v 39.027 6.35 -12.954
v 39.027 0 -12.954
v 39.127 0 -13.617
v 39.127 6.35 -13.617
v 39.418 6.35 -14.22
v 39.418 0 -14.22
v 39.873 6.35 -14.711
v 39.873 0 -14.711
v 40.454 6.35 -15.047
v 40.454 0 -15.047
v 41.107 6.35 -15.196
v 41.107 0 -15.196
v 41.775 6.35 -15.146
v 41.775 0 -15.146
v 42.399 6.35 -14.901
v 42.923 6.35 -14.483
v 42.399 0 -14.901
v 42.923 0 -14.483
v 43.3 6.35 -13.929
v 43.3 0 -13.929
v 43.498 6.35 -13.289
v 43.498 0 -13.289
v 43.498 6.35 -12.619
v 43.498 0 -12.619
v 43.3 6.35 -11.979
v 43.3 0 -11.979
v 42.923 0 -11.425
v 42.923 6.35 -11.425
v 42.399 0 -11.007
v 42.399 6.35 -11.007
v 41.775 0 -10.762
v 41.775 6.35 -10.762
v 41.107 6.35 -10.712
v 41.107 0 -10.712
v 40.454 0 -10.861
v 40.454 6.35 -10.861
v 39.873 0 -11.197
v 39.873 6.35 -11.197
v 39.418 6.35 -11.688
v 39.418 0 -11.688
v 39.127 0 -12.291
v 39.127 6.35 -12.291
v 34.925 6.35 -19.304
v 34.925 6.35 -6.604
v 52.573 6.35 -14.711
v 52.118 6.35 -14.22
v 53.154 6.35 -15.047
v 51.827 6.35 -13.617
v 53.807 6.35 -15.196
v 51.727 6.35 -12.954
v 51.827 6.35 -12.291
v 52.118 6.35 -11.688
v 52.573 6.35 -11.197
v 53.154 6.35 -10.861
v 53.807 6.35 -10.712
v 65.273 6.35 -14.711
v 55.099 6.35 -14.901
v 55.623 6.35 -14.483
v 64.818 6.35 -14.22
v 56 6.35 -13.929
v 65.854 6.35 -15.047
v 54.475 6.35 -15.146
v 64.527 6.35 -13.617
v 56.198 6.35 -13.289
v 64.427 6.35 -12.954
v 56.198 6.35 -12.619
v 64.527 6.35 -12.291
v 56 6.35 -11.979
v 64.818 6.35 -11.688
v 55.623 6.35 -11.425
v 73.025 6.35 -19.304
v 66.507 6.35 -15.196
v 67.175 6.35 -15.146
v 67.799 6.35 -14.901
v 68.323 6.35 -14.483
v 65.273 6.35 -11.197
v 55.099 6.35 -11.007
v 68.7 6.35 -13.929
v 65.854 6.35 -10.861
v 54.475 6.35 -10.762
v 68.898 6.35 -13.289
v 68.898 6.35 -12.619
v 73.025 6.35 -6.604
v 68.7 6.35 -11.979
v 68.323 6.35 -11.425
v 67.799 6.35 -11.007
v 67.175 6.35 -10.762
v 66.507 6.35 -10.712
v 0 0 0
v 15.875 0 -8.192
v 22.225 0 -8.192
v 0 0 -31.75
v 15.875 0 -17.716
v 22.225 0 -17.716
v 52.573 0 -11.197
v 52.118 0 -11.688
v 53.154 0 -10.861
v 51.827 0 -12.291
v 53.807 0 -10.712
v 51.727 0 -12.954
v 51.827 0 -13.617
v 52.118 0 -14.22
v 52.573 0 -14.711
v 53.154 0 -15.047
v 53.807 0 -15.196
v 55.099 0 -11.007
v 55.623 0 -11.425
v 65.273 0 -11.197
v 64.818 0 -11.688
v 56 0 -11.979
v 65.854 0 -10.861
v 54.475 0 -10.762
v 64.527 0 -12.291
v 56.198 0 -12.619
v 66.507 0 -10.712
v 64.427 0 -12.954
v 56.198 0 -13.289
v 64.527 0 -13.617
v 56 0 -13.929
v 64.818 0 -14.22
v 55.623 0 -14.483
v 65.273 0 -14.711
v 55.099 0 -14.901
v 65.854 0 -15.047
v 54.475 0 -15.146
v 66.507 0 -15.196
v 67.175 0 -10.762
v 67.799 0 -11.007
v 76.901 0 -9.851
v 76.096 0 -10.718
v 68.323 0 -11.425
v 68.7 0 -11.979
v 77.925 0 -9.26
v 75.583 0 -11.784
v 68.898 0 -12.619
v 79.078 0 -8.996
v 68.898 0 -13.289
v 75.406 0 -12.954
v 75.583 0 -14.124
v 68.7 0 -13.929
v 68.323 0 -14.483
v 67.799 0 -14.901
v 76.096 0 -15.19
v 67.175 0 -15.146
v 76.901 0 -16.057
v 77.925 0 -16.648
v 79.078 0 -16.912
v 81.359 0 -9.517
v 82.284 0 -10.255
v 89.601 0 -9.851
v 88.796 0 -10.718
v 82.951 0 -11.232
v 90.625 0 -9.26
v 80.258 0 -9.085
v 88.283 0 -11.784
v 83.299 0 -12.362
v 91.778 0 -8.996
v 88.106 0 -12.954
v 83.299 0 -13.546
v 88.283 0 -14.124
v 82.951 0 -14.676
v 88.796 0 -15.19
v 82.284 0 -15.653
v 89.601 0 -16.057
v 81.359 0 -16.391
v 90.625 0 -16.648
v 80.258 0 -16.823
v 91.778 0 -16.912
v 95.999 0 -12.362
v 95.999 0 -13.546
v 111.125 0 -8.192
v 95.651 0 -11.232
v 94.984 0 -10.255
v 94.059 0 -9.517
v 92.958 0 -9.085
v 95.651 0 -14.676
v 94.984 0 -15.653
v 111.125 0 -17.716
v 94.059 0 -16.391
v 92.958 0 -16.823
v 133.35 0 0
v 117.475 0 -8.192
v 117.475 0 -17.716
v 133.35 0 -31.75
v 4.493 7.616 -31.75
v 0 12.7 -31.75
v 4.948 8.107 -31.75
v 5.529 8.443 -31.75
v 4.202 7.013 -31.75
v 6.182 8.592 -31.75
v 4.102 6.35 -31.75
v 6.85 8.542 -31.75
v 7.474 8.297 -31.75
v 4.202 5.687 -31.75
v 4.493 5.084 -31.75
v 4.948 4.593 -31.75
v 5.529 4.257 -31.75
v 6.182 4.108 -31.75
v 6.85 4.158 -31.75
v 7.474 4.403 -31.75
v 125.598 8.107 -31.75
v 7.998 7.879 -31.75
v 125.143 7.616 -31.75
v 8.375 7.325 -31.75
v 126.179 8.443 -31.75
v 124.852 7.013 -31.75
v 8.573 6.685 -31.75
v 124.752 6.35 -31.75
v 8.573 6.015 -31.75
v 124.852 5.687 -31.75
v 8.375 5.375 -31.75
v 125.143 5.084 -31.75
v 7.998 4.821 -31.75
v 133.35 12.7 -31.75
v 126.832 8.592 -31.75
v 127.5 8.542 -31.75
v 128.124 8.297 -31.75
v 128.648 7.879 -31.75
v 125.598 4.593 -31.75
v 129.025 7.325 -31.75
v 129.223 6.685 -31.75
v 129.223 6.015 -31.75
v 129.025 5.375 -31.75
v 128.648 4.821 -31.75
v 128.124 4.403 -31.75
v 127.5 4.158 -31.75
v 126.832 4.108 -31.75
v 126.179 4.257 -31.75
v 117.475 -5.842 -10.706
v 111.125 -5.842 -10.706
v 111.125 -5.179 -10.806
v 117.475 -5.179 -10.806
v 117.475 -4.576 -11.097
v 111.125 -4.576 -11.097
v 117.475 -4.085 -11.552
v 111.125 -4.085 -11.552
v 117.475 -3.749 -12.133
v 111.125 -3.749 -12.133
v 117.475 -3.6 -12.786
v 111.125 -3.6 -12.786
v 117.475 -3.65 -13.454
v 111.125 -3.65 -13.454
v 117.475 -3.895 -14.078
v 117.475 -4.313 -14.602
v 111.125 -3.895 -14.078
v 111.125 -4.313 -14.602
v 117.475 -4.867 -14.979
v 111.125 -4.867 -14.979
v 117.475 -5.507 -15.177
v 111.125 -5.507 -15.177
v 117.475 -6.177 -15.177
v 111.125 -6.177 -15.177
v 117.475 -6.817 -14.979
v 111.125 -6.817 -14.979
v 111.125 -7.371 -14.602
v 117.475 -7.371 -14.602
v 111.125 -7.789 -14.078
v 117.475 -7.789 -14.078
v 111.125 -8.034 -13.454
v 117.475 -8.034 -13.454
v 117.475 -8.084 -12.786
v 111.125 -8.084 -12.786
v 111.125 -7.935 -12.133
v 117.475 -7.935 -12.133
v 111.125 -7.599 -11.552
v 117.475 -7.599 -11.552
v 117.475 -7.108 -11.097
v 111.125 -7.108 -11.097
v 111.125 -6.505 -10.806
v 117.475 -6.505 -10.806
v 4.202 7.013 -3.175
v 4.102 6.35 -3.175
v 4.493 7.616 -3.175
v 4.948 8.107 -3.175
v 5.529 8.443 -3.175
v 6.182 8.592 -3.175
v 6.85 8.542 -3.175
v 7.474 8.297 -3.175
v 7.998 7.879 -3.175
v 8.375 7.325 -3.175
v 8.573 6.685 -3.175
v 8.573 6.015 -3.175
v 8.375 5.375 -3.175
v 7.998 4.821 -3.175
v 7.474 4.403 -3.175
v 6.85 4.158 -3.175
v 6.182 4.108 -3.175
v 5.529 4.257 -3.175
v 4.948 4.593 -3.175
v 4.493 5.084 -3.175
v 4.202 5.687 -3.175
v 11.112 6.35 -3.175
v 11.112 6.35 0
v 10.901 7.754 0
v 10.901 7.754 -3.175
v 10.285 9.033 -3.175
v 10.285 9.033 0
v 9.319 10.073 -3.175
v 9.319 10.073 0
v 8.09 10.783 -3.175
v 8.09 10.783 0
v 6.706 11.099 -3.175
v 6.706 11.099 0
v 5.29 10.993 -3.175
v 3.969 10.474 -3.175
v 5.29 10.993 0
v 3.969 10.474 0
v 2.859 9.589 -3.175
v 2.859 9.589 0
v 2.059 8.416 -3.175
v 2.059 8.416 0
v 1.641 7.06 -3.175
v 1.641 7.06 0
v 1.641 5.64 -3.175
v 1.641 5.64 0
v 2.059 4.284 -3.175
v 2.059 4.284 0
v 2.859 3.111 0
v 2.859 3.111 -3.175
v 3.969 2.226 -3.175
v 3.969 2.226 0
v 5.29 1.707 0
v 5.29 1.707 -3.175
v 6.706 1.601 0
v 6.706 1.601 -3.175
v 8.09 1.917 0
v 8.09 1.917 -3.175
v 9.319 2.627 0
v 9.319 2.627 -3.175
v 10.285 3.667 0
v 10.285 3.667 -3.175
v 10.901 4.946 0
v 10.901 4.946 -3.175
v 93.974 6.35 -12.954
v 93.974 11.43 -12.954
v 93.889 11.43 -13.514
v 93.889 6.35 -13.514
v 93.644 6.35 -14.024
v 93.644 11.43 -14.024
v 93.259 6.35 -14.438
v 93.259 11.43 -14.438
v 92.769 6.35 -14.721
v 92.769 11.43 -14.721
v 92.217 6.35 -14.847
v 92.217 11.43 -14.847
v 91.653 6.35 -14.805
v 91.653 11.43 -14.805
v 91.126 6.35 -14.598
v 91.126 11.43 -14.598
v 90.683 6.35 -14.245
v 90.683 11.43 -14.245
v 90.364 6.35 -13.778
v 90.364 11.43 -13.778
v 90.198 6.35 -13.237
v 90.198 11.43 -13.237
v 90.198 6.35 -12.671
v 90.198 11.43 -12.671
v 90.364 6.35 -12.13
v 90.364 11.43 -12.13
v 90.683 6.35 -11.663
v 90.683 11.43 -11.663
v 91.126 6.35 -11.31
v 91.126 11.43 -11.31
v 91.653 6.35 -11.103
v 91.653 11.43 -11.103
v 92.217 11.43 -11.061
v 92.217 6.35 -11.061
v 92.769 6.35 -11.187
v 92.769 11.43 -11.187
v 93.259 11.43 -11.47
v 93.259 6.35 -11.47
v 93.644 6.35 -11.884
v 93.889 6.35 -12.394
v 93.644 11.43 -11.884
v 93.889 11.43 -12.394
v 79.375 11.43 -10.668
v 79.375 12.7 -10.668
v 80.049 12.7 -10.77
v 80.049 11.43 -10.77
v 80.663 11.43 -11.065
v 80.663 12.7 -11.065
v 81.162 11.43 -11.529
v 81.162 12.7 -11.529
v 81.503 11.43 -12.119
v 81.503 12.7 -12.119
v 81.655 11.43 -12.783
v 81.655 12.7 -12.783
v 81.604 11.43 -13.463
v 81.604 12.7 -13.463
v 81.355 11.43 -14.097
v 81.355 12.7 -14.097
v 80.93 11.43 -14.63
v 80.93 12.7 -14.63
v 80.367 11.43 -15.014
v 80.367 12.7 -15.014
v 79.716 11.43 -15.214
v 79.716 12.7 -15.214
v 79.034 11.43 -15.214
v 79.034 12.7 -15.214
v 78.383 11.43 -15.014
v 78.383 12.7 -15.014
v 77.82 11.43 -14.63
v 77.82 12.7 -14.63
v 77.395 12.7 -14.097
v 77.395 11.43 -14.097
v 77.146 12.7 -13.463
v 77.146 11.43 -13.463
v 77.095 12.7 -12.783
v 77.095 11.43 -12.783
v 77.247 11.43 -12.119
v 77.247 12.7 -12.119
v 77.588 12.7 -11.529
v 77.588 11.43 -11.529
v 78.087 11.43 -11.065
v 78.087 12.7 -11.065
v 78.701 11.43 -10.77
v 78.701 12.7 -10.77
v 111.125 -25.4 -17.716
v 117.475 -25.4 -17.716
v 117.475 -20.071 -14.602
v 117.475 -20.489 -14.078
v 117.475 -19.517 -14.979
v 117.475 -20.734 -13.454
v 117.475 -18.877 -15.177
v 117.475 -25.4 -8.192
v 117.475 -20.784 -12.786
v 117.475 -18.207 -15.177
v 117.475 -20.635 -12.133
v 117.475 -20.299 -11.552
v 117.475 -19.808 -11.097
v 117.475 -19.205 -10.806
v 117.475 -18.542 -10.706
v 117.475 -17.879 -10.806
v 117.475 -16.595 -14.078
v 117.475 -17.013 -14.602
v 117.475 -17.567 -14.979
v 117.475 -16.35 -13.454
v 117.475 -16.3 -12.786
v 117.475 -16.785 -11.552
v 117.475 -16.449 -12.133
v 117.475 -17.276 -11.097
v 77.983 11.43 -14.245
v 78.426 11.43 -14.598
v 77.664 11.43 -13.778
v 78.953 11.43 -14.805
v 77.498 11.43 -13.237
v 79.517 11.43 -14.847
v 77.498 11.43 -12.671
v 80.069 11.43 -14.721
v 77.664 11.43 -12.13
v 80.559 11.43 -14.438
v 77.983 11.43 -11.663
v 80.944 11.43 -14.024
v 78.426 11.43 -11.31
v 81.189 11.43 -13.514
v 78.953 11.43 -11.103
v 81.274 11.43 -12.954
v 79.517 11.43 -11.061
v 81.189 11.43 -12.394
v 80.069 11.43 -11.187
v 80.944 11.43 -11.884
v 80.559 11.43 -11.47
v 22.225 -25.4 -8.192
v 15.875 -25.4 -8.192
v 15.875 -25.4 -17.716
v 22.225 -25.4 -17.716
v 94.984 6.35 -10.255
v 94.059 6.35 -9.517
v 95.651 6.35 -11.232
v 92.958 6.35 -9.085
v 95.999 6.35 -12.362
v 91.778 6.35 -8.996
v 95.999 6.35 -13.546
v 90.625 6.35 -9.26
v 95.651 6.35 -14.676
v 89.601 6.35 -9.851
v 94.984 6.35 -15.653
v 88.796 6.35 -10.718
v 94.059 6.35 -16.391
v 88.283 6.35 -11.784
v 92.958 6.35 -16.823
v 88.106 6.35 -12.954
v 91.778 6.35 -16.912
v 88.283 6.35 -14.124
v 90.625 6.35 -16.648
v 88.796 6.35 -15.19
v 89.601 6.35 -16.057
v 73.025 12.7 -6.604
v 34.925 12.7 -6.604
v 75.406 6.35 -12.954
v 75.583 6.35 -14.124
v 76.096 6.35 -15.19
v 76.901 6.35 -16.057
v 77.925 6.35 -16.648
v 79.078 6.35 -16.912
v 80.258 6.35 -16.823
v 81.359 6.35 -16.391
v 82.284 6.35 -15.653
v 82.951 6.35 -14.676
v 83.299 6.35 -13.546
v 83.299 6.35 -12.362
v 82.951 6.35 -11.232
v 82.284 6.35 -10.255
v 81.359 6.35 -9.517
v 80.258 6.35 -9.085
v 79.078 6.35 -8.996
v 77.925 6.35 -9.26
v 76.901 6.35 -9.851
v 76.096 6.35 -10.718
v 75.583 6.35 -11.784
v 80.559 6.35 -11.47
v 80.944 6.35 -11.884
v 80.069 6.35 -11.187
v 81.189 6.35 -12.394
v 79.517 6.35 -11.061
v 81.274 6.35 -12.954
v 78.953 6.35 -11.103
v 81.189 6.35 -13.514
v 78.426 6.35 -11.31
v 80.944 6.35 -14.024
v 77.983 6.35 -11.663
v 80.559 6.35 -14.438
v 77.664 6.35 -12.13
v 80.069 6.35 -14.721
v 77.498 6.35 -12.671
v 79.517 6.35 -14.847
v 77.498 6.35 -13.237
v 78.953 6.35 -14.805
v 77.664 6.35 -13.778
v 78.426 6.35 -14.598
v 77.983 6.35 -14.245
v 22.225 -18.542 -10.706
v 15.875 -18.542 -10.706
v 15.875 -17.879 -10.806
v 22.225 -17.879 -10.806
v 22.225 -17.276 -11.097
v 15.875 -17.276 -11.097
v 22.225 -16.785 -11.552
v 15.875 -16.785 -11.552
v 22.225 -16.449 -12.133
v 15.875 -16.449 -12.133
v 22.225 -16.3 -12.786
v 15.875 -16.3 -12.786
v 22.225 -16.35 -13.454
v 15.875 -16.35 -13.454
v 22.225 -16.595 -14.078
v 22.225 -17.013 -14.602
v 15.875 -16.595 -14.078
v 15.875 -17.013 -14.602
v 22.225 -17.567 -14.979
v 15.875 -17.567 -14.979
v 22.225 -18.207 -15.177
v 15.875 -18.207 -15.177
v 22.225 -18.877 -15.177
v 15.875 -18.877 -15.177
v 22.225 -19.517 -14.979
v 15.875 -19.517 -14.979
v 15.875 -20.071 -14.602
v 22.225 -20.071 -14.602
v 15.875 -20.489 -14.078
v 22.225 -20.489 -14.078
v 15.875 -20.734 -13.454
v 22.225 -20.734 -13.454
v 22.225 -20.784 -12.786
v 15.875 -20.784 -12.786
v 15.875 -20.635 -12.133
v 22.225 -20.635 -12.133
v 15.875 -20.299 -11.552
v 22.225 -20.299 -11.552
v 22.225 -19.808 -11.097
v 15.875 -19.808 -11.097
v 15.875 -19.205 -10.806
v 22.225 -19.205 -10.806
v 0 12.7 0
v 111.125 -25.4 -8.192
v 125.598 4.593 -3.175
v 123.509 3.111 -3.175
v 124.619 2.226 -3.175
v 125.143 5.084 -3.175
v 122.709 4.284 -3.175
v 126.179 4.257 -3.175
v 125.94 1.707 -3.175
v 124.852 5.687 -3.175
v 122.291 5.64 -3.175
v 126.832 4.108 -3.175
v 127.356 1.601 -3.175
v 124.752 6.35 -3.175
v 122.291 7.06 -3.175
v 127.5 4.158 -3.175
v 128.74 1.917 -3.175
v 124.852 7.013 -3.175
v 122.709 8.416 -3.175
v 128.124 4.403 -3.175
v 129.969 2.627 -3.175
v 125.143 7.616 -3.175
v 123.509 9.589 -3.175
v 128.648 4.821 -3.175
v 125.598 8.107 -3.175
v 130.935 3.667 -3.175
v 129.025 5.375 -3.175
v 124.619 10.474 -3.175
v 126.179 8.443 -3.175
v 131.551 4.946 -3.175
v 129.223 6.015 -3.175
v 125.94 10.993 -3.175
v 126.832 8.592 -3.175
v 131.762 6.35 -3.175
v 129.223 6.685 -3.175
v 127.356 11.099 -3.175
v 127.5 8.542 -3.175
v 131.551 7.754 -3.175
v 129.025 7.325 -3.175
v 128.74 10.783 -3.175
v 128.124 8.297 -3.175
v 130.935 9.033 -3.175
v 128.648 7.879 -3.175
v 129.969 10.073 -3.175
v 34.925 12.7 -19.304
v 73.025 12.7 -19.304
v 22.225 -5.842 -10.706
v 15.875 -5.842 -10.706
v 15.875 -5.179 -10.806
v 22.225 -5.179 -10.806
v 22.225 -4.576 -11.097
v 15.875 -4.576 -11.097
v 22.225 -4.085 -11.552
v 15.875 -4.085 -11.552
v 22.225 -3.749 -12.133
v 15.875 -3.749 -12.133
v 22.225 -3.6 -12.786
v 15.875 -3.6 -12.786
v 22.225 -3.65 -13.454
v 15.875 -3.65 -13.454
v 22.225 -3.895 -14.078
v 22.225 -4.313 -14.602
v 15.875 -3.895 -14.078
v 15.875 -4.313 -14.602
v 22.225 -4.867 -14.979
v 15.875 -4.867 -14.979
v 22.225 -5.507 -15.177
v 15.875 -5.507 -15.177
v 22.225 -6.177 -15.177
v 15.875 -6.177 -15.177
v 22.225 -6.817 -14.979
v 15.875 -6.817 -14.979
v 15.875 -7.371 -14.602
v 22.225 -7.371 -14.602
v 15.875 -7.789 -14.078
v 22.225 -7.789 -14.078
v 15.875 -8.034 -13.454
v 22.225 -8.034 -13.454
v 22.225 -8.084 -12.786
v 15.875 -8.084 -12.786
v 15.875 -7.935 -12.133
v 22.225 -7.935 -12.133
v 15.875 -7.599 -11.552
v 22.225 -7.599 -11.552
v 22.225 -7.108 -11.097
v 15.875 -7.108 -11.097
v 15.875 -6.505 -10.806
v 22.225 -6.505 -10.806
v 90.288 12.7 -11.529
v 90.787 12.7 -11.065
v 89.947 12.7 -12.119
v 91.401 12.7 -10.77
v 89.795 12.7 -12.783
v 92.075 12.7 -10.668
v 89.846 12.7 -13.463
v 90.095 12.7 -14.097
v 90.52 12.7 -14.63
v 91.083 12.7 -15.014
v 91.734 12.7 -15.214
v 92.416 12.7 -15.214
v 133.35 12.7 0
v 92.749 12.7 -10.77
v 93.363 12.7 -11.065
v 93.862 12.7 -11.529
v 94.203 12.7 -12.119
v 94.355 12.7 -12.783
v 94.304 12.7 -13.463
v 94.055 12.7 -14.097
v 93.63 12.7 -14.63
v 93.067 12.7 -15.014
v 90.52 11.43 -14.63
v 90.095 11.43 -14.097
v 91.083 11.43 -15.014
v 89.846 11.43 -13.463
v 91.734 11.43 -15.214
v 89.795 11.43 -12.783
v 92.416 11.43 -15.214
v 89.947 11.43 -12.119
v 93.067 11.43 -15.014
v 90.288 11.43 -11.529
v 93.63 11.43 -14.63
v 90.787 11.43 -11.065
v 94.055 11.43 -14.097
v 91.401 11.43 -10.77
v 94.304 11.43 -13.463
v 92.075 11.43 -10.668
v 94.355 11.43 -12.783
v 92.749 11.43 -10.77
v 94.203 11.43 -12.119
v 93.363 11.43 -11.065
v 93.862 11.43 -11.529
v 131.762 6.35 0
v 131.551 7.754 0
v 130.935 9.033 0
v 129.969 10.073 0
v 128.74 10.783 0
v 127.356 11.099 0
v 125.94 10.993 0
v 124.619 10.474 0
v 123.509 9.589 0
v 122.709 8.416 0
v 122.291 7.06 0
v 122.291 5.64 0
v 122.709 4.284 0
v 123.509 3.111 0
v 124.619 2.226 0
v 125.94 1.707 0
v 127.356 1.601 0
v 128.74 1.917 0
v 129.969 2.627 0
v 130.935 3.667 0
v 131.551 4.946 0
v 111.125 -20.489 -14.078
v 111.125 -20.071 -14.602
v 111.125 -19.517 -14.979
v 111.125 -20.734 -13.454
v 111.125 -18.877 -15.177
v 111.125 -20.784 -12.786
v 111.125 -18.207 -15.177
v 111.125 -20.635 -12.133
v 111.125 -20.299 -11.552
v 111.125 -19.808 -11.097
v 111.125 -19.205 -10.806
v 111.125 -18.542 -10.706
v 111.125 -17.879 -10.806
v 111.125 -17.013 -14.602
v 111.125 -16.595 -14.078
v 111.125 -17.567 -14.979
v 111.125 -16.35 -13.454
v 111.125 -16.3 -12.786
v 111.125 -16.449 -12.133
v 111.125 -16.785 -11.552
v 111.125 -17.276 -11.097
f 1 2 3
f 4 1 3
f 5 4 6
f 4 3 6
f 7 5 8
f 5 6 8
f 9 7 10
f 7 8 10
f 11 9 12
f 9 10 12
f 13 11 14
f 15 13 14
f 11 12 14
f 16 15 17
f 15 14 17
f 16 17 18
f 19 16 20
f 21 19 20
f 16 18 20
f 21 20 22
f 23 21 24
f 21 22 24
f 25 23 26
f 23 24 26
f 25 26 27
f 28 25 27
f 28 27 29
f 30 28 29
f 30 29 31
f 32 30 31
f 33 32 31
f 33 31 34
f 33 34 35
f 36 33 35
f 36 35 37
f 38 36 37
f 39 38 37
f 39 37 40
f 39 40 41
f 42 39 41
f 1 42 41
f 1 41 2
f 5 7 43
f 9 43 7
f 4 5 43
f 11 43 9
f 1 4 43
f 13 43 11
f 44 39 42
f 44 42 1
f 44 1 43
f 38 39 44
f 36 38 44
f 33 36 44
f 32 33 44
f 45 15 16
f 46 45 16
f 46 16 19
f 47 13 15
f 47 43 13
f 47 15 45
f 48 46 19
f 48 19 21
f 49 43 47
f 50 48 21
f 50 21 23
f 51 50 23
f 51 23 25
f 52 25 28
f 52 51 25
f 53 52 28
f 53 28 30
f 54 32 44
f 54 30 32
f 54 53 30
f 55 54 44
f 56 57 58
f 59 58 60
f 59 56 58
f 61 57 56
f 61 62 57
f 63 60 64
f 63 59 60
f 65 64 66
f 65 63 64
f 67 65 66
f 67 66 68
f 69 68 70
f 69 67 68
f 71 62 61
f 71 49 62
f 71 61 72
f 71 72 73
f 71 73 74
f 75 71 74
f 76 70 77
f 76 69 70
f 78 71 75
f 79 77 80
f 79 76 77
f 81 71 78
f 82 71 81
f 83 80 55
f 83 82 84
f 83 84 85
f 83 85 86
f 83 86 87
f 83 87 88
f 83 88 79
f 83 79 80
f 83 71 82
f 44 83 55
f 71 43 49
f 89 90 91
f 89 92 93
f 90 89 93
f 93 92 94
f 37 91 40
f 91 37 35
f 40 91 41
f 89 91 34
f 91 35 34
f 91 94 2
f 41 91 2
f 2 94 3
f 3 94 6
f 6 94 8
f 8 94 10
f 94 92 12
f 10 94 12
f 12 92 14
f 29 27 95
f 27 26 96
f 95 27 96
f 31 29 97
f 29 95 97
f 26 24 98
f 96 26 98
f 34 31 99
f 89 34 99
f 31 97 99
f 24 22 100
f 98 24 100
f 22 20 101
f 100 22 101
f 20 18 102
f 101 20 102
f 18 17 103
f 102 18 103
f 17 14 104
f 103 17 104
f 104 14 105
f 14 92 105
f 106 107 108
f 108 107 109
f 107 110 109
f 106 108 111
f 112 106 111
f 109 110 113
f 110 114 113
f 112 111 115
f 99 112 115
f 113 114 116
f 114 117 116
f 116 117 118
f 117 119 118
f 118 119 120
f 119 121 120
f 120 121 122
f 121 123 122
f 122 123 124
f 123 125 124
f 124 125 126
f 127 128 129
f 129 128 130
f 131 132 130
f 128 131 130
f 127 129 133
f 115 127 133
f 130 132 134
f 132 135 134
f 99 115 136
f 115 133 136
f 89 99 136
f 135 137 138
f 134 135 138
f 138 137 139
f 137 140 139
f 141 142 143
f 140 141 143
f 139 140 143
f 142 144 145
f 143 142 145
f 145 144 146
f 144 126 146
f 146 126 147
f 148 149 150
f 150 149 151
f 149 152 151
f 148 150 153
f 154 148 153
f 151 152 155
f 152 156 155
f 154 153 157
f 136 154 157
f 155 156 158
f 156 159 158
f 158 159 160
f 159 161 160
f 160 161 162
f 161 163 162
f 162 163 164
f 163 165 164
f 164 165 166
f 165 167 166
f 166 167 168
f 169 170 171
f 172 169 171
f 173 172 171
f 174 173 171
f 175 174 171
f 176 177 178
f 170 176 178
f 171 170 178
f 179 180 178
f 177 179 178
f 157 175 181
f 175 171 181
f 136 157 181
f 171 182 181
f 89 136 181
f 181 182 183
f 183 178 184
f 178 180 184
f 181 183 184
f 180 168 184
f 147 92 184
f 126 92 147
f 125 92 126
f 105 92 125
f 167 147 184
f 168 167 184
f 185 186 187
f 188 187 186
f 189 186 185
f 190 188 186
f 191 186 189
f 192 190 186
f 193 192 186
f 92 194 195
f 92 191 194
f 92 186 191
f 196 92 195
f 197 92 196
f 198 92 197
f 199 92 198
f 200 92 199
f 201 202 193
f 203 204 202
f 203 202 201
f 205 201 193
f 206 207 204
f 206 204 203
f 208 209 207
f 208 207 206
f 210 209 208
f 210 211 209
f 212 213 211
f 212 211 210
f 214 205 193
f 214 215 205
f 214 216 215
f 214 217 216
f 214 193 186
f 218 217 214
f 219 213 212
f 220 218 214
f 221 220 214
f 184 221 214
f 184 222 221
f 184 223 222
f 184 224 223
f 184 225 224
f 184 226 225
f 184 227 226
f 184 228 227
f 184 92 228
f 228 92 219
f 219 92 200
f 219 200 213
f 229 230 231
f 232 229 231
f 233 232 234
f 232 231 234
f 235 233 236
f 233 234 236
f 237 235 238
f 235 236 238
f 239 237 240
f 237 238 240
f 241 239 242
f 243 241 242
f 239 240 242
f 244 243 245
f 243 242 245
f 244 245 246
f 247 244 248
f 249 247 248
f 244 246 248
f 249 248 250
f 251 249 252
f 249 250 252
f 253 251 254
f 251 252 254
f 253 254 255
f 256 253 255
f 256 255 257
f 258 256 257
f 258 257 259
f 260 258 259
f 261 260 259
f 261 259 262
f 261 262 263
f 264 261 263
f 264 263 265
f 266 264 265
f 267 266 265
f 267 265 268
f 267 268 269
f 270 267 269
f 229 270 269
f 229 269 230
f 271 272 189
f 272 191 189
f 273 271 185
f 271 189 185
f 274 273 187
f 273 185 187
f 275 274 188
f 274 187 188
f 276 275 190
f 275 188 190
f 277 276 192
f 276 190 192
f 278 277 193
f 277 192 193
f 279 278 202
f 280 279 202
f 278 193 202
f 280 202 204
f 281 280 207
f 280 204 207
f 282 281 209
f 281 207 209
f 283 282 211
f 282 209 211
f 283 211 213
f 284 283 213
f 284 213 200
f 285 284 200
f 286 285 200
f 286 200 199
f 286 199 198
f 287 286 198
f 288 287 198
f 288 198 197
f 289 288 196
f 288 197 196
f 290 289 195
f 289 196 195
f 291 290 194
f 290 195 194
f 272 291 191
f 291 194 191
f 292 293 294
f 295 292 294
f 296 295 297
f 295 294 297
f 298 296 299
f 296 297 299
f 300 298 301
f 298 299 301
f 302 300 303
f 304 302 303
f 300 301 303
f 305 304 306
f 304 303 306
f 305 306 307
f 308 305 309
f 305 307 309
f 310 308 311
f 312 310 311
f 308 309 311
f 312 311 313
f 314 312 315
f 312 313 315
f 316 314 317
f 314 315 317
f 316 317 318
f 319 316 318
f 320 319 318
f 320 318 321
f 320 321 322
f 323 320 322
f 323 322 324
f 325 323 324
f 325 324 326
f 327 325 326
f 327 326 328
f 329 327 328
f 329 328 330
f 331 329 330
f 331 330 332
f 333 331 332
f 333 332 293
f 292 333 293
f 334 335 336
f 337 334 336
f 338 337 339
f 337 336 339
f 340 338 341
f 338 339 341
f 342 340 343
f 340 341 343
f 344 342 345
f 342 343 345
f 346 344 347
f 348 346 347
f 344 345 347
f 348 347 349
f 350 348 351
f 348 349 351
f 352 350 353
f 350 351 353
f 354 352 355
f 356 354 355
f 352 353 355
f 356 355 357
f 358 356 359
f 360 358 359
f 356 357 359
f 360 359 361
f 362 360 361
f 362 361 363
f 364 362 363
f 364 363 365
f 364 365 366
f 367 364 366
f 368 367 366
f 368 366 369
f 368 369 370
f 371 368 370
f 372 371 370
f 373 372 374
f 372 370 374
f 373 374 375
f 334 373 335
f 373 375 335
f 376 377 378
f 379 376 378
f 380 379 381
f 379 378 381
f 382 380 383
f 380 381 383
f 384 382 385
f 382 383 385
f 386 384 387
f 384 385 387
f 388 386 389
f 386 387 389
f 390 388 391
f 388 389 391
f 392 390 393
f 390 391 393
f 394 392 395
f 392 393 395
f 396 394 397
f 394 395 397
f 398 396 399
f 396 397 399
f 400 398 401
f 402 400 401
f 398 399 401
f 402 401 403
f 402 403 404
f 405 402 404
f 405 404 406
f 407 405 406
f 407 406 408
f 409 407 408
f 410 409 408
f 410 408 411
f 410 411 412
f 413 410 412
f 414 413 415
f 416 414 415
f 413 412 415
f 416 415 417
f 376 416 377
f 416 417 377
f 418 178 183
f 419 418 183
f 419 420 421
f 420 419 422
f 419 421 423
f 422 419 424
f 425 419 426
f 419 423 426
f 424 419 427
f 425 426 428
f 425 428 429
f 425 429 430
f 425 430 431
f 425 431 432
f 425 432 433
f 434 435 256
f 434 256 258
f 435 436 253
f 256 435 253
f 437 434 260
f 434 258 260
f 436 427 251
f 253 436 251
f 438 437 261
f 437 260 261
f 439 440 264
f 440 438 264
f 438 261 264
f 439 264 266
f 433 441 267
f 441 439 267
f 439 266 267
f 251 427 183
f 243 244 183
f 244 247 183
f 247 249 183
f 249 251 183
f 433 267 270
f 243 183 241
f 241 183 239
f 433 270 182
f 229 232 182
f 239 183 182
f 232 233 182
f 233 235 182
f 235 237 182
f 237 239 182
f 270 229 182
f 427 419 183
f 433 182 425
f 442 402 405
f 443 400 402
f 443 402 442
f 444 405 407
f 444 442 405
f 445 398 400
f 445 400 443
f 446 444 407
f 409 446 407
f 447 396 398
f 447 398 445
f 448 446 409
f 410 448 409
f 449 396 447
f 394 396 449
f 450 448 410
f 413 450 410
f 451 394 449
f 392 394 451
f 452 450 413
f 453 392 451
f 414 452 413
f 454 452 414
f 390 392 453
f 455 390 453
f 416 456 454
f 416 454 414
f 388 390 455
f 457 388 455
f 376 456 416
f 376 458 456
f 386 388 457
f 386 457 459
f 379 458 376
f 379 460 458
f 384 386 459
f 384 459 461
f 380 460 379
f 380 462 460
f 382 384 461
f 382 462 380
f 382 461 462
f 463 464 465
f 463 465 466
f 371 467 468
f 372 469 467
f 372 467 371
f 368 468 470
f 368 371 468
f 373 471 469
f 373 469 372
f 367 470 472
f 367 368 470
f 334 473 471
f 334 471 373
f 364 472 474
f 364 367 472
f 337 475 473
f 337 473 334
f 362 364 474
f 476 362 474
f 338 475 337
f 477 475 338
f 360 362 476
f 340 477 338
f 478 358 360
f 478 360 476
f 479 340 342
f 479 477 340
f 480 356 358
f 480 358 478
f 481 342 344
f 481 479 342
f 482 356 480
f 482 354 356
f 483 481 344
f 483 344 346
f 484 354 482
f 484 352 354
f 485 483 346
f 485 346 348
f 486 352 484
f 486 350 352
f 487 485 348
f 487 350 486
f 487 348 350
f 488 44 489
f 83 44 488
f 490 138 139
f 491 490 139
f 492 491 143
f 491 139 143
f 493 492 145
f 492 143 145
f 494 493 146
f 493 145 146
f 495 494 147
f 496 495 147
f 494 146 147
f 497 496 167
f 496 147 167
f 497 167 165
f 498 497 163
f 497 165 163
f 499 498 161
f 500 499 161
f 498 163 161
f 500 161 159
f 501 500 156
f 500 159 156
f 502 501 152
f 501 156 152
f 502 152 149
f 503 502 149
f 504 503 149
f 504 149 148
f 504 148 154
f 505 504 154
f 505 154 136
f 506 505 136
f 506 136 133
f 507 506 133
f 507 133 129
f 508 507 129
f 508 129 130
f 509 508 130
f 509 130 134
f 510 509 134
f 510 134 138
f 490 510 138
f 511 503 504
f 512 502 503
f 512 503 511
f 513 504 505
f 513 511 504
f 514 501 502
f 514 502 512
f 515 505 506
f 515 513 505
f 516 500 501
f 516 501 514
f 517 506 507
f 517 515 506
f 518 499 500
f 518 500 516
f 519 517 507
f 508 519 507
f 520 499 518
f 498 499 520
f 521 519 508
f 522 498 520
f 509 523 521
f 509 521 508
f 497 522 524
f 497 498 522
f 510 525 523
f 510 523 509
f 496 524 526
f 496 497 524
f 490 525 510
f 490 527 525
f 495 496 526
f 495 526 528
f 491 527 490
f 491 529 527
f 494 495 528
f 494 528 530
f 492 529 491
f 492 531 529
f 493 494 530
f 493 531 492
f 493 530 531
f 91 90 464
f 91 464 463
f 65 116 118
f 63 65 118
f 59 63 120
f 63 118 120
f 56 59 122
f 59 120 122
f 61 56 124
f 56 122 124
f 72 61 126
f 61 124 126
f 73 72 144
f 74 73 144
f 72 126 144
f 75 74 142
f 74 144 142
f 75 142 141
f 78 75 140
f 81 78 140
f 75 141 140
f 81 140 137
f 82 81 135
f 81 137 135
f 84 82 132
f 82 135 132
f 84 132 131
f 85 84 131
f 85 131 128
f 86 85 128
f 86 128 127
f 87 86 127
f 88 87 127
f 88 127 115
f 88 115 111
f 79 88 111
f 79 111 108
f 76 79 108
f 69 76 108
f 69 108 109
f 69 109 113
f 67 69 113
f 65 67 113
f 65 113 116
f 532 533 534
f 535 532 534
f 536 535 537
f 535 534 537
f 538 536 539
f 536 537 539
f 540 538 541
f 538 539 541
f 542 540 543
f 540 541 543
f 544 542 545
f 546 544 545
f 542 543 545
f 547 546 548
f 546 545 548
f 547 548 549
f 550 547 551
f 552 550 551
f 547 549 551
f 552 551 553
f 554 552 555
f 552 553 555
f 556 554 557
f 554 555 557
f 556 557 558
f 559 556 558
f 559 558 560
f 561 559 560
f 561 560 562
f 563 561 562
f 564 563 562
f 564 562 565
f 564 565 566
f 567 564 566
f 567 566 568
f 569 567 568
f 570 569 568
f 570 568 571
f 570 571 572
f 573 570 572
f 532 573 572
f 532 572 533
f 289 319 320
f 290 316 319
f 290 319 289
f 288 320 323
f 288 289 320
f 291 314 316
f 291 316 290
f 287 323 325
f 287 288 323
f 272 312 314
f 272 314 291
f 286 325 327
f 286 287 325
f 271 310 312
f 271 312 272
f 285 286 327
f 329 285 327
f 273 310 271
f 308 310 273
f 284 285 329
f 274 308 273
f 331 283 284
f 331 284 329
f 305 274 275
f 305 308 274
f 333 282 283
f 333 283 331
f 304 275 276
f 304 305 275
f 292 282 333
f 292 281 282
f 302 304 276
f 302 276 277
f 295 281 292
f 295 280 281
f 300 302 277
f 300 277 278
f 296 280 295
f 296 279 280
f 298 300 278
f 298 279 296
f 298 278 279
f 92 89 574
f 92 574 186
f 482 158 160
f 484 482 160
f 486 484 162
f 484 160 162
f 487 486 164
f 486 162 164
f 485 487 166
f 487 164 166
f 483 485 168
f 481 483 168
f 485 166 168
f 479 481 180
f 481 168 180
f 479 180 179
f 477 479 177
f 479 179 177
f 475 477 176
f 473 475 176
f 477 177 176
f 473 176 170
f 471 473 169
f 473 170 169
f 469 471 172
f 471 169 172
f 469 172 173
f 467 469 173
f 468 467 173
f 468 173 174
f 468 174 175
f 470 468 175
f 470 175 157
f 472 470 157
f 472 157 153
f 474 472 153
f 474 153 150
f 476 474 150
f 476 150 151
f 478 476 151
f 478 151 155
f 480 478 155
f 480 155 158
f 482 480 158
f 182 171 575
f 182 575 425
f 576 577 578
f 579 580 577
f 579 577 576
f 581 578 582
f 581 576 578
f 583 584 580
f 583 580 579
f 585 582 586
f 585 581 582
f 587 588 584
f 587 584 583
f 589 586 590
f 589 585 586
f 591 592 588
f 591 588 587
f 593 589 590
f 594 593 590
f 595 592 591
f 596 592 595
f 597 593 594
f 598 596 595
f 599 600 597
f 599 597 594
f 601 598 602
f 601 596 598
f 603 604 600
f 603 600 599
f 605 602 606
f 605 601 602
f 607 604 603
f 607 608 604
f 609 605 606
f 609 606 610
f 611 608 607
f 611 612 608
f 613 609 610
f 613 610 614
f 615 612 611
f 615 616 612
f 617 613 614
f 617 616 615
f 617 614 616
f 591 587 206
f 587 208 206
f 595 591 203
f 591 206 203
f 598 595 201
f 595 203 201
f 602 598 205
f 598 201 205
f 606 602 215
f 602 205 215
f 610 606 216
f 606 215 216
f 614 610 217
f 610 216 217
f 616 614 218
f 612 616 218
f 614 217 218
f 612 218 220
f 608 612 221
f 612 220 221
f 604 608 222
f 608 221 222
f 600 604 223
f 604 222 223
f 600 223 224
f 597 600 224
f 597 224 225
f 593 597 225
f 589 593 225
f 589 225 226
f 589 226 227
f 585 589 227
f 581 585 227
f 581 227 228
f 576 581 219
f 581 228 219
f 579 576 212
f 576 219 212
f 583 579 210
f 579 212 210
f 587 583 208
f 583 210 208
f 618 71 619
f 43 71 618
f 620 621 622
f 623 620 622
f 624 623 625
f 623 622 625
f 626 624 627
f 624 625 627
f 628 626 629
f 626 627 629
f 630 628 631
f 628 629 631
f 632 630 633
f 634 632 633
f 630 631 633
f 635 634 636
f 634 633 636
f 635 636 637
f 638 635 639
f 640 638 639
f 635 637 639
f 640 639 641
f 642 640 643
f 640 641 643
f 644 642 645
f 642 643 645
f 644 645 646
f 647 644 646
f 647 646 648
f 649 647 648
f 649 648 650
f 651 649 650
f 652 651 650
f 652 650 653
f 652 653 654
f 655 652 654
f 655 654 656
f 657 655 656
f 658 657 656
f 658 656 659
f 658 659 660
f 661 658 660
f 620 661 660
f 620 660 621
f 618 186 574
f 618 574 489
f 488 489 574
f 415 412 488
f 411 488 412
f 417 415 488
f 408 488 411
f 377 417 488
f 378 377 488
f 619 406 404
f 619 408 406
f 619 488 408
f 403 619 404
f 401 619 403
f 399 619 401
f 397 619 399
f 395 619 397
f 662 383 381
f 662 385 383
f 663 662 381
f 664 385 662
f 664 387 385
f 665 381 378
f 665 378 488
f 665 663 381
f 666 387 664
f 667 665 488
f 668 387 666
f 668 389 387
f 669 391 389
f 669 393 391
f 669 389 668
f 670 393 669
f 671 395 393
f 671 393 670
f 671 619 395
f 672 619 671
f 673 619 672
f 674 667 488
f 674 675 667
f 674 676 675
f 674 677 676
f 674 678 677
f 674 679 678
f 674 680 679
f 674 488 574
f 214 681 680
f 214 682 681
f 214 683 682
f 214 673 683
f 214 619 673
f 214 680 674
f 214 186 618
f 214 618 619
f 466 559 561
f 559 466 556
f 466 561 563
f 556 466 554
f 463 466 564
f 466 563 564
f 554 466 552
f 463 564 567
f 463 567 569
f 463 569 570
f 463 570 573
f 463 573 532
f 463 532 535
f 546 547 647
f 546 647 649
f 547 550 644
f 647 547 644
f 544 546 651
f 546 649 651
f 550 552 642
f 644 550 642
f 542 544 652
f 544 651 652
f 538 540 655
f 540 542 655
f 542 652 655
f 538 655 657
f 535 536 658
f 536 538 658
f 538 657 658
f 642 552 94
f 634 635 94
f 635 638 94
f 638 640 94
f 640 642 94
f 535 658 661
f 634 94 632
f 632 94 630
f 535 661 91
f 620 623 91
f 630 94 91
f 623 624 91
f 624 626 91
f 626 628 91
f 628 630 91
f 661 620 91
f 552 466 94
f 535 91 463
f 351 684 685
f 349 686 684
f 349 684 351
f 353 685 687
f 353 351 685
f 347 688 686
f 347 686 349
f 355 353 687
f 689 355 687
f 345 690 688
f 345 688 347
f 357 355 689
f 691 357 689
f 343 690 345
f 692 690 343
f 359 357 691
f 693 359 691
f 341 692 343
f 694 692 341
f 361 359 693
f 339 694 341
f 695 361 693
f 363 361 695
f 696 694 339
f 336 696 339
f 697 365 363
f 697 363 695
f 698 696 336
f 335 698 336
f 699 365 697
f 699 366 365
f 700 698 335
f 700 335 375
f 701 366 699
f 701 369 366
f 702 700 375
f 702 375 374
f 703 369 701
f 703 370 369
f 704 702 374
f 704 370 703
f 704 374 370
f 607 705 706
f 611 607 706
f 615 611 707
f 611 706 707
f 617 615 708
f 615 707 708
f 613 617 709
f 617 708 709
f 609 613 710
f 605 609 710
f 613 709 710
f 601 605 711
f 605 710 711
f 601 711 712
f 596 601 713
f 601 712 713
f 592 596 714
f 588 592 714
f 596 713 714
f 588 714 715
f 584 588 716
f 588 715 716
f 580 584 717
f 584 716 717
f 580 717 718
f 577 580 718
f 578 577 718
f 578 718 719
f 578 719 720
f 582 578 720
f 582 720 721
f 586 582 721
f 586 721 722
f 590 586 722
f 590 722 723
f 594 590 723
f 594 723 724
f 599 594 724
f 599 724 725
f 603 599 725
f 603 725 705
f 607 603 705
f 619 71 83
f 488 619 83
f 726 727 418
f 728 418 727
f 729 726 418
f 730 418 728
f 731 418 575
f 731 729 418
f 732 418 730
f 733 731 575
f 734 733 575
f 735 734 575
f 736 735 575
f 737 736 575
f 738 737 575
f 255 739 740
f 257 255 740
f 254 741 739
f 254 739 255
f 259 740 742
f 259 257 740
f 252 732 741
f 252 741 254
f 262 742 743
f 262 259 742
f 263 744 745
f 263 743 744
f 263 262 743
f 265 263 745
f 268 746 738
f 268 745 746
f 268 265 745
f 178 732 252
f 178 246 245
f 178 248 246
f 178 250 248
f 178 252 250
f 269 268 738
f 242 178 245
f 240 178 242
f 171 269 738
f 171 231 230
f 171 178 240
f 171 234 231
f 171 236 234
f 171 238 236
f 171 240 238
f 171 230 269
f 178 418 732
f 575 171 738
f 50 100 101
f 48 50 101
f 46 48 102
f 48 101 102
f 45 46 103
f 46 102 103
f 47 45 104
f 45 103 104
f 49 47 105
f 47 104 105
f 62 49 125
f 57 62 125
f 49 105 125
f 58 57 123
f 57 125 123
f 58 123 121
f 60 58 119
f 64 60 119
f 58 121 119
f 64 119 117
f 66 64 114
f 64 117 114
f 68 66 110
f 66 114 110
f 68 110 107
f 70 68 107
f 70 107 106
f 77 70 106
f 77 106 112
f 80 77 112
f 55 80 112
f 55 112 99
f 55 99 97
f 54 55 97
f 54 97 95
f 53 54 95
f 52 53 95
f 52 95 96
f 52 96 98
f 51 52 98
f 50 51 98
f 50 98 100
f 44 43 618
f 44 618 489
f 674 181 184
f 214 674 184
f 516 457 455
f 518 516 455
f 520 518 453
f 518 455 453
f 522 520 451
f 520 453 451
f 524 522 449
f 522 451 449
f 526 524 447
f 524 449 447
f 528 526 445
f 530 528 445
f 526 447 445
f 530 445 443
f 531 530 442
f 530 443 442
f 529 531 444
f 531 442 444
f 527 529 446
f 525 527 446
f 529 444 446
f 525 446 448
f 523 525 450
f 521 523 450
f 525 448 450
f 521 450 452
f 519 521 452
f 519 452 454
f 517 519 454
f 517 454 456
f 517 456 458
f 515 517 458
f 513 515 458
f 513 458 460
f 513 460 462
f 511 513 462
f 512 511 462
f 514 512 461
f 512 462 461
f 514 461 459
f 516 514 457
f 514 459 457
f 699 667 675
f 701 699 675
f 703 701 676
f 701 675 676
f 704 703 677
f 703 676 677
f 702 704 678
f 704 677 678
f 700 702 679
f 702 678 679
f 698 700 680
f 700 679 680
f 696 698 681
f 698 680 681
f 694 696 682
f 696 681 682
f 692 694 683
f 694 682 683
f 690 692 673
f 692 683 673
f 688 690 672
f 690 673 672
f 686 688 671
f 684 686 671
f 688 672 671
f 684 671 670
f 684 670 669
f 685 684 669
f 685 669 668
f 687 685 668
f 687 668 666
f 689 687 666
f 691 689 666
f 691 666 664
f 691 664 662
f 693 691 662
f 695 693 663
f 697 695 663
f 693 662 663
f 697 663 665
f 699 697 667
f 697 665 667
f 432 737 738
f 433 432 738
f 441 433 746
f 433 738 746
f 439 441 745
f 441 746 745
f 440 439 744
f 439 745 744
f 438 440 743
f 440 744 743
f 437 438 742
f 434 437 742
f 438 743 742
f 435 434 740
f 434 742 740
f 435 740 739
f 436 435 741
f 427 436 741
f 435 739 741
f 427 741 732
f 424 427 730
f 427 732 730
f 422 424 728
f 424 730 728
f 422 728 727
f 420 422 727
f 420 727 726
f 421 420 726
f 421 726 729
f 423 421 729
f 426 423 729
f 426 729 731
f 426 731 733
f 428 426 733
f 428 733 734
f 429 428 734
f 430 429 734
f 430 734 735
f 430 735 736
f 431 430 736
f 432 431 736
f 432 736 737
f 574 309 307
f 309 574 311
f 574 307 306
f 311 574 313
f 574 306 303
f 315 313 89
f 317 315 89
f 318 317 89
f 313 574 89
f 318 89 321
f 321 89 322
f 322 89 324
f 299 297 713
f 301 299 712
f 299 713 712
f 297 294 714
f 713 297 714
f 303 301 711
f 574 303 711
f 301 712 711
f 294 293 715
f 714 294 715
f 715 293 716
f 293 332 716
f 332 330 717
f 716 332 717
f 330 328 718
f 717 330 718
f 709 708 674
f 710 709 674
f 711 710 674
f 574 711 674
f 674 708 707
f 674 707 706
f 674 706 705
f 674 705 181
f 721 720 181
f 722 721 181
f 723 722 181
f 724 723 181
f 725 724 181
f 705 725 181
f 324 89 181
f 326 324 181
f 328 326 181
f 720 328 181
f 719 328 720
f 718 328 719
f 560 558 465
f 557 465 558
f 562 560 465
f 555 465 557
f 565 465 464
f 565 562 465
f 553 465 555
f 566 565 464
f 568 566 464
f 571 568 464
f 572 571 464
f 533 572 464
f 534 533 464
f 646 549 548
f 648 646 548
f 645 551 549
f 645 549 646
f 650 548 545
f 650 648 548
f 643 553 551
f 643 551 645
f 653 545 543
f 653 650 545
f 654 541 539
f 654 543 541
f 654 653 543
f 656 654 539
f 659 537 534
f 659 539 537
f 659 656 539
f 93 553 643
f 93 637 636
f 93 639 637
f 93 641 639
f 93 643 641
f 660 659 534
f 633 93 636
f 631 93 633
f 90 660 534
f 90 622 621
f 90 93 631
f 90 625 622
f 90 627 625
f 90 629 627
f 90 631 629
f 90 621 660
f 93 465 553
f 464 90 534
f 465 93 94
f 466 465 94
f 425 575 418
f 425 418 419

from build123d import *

# Parameters (mm, degrees)
SKETCH1_W                                           = 133.35
SKETCH1_H                                           = 31.75
BOSS_EXTRUDE1_DEPTH                                 = 12.7
CBORE_FOR_8_BINDING_HEAD_MACHINE_SCREW1_D           = 4.4958
CBORE_FOR_8_BINDING_HEAD_MACHINE_SCREW1_CBORE_D     = 9.525
CBORE_FOR_8_BINDING_HEAD_MACHINE_SCREW1_CBORE_DEPTH = 3.175
F_8_0_199_DIAMETER_HOLE1_D                          = 4.4958
SKETCH6_W                                           = 6.35
SKETCH6_H                                           = 9.525
BOSS_EXTRUDE2_DEPTH                                 = 25.4
F_8_0_199_DIAMETER_HOLE2_D                          = 4.4958
CBORE_FOR_6_BINDING_HEAD_MACHINE_SCREW1_D           = 3.7973
CBORE_FOR_6_BINDING_HEAD_MACHINE_SCREW1_CBORE_D     = 7.9375
CBORE_FOR_6_BINDING_HEAD_MACHINE_SCREW1_CBORE_DEPTH = 6.35
SKETCH12_R                                          = 2.286
CUT_EXTRUDE1_DEPTH                                  = 1.27
CUT_EXTRUDE2_START                                  = -6.35
SKETCH13_R                                          = 2.2479
CUT_EXTRUDE2_DEPTH                                  = 6.35
F_8_0_199_DIAMETER_HOLE3_D                          = 4.4958


with BuildPart() as part:
    # Sketch1 → Boss-Extrude1 (new body)
    with BuildSketch(Plane(origin=(0, 0, 0), x_dir=(1, 0, 0), z_dir=(0, 1, 0))):
        with Locations((66.675, 15.875)):
            Rectangle(SKETCH1_W, SKETCH1_H)
    extrude(amount=BOSS_EXTRUDE1_DEPTH)

    # CBORE for #8 Binding Head Machine Screw1 (through all)
    with Locations(Plane.XY):
        with Locations((6.35, 6.35), (127, 6.35)):
            CounterBoreHole(CBORE_FOR_8_BINDING_HEAD_MACHINE_SCREW1_D / 2, CBORE_FOR_8_BINDING_HEAD_MACHINE_SCREW1_CBORE_D / 2, CBORE_FOR_8_BINDING_HEAD_MACHINE_SCREW1_CBORE_DEPTH)

    # #8 (0.199) Diameter Hole1 (through all)
    with Locations(Plane(origin=(0, 12.7, 0), x_dir=(1, 0, 0), z_dir=(0, 1, 0))):
        with Locations((66.675, 12.954)):
            Hole(F_8_0_199_DIAMETER_HOLE1_D / 2)

    # Sketch6 → Boss-Extrude2 (add)
    with BuildSketch(Plane.XZ):
        with Locations((114.3, -12.954)):
            Rectangle(SKETCH6_W, SKETCH6_H)
        with Locations((19.05, -12.954)):
            Rectangle(SKETCH6_W, SKETCH6_H)
    extrude(amount=BOSS_EXTRUDE2_DEPTH)

    # #8 (0.199) Diameter Hole2 (through all)
    with Locations(Plane(origin=(117.475, 0, 0), x_dir=(0, 0, -1), z_dir=(1, 0, 0))):
        with Locations((12.954, -5.842), (12.954, -18.542)):
            Hole(F_8_0_199_DIAMETER_HOLE2_D / 2)

    # CBORE for #6 Binding Head Machine Screw1 (through all)
    with Locations(Plane(origin=(0, 0, 0), x_dir=(-1, 0, 0), z_dir=(0, -1, 0))):
        with Locations((-79.375, 12.954), (-92.075, 12.954)):
            CounterBoreHole(CBORE_FOR_6_BINDING_HEAD_MACHINE_SCREW1_D / 2, CBORE_FOR_6_BINDING_HEAD_MACHINE_SCREW1_CBORE_D / 2, CBORE_FOR_6_BINDING_HEAD_MACHINE_SCREW1_CBORE_DEPTH)

    # Sketch12 → Cut-Extrude1 (cut)
    with BuildSketch(Plane(origin=(0, 12.7, 0), x_dir=(1, 0, 0), z_dir=(0, 1, 0))):
        with Locations(Location((79.375, 12.954, 0), (0, 0, 270))):
            Circle(SKETCH12_R)
        with Locations(Location((92.075, 12.954, 0), (0, 0, 270))):
            Circle(SKETCH12_R)
    extrude(amount=-CUT_EXTRUDE1_DEPTH, mode=Mode.SUBTRACT)

    # Sketch13 → Cut-Extrude2 (cut)
    with BuildSketch(Plane(origin=(0, 12.7, 0), x_dir=(1, 0, 0), z_dir=(0, 1, 0)).offset(CUT_EXTRUDE2_START)):
        with Locations(Location((66.675, 12.954, 0), (0, 0, 270))):
            Circle(SKETCH13_R)
        Polygon((34.925, 6.604), (66.675, 6.604), (66.675, 12.954), (66.675, 19.304), (34.925, 19.304), align=None)
        Polygon((73.025, 6.604), (66.675, 6.604), (66.675, 12.954), (66.675, 19.304), (73.025, 19.304), align=None)
    extrude(amount=CUT_EXTRUDE2_DEPTH, mode=Mode.SUBTRACT)

    # #8 (0.199) Diameter Hole3 (through all)
    with Locations(Plane(origin=(0, 6.35, 0), x_dir=(1, 0, 0), z_dir=(0, 1, 0))):
        with Locations((53.975, 12.954), (41.275, 12.954)):
            Hole(F_8_0_199_DIAMETER_HOLE3_D / 2)


solid = part.part
